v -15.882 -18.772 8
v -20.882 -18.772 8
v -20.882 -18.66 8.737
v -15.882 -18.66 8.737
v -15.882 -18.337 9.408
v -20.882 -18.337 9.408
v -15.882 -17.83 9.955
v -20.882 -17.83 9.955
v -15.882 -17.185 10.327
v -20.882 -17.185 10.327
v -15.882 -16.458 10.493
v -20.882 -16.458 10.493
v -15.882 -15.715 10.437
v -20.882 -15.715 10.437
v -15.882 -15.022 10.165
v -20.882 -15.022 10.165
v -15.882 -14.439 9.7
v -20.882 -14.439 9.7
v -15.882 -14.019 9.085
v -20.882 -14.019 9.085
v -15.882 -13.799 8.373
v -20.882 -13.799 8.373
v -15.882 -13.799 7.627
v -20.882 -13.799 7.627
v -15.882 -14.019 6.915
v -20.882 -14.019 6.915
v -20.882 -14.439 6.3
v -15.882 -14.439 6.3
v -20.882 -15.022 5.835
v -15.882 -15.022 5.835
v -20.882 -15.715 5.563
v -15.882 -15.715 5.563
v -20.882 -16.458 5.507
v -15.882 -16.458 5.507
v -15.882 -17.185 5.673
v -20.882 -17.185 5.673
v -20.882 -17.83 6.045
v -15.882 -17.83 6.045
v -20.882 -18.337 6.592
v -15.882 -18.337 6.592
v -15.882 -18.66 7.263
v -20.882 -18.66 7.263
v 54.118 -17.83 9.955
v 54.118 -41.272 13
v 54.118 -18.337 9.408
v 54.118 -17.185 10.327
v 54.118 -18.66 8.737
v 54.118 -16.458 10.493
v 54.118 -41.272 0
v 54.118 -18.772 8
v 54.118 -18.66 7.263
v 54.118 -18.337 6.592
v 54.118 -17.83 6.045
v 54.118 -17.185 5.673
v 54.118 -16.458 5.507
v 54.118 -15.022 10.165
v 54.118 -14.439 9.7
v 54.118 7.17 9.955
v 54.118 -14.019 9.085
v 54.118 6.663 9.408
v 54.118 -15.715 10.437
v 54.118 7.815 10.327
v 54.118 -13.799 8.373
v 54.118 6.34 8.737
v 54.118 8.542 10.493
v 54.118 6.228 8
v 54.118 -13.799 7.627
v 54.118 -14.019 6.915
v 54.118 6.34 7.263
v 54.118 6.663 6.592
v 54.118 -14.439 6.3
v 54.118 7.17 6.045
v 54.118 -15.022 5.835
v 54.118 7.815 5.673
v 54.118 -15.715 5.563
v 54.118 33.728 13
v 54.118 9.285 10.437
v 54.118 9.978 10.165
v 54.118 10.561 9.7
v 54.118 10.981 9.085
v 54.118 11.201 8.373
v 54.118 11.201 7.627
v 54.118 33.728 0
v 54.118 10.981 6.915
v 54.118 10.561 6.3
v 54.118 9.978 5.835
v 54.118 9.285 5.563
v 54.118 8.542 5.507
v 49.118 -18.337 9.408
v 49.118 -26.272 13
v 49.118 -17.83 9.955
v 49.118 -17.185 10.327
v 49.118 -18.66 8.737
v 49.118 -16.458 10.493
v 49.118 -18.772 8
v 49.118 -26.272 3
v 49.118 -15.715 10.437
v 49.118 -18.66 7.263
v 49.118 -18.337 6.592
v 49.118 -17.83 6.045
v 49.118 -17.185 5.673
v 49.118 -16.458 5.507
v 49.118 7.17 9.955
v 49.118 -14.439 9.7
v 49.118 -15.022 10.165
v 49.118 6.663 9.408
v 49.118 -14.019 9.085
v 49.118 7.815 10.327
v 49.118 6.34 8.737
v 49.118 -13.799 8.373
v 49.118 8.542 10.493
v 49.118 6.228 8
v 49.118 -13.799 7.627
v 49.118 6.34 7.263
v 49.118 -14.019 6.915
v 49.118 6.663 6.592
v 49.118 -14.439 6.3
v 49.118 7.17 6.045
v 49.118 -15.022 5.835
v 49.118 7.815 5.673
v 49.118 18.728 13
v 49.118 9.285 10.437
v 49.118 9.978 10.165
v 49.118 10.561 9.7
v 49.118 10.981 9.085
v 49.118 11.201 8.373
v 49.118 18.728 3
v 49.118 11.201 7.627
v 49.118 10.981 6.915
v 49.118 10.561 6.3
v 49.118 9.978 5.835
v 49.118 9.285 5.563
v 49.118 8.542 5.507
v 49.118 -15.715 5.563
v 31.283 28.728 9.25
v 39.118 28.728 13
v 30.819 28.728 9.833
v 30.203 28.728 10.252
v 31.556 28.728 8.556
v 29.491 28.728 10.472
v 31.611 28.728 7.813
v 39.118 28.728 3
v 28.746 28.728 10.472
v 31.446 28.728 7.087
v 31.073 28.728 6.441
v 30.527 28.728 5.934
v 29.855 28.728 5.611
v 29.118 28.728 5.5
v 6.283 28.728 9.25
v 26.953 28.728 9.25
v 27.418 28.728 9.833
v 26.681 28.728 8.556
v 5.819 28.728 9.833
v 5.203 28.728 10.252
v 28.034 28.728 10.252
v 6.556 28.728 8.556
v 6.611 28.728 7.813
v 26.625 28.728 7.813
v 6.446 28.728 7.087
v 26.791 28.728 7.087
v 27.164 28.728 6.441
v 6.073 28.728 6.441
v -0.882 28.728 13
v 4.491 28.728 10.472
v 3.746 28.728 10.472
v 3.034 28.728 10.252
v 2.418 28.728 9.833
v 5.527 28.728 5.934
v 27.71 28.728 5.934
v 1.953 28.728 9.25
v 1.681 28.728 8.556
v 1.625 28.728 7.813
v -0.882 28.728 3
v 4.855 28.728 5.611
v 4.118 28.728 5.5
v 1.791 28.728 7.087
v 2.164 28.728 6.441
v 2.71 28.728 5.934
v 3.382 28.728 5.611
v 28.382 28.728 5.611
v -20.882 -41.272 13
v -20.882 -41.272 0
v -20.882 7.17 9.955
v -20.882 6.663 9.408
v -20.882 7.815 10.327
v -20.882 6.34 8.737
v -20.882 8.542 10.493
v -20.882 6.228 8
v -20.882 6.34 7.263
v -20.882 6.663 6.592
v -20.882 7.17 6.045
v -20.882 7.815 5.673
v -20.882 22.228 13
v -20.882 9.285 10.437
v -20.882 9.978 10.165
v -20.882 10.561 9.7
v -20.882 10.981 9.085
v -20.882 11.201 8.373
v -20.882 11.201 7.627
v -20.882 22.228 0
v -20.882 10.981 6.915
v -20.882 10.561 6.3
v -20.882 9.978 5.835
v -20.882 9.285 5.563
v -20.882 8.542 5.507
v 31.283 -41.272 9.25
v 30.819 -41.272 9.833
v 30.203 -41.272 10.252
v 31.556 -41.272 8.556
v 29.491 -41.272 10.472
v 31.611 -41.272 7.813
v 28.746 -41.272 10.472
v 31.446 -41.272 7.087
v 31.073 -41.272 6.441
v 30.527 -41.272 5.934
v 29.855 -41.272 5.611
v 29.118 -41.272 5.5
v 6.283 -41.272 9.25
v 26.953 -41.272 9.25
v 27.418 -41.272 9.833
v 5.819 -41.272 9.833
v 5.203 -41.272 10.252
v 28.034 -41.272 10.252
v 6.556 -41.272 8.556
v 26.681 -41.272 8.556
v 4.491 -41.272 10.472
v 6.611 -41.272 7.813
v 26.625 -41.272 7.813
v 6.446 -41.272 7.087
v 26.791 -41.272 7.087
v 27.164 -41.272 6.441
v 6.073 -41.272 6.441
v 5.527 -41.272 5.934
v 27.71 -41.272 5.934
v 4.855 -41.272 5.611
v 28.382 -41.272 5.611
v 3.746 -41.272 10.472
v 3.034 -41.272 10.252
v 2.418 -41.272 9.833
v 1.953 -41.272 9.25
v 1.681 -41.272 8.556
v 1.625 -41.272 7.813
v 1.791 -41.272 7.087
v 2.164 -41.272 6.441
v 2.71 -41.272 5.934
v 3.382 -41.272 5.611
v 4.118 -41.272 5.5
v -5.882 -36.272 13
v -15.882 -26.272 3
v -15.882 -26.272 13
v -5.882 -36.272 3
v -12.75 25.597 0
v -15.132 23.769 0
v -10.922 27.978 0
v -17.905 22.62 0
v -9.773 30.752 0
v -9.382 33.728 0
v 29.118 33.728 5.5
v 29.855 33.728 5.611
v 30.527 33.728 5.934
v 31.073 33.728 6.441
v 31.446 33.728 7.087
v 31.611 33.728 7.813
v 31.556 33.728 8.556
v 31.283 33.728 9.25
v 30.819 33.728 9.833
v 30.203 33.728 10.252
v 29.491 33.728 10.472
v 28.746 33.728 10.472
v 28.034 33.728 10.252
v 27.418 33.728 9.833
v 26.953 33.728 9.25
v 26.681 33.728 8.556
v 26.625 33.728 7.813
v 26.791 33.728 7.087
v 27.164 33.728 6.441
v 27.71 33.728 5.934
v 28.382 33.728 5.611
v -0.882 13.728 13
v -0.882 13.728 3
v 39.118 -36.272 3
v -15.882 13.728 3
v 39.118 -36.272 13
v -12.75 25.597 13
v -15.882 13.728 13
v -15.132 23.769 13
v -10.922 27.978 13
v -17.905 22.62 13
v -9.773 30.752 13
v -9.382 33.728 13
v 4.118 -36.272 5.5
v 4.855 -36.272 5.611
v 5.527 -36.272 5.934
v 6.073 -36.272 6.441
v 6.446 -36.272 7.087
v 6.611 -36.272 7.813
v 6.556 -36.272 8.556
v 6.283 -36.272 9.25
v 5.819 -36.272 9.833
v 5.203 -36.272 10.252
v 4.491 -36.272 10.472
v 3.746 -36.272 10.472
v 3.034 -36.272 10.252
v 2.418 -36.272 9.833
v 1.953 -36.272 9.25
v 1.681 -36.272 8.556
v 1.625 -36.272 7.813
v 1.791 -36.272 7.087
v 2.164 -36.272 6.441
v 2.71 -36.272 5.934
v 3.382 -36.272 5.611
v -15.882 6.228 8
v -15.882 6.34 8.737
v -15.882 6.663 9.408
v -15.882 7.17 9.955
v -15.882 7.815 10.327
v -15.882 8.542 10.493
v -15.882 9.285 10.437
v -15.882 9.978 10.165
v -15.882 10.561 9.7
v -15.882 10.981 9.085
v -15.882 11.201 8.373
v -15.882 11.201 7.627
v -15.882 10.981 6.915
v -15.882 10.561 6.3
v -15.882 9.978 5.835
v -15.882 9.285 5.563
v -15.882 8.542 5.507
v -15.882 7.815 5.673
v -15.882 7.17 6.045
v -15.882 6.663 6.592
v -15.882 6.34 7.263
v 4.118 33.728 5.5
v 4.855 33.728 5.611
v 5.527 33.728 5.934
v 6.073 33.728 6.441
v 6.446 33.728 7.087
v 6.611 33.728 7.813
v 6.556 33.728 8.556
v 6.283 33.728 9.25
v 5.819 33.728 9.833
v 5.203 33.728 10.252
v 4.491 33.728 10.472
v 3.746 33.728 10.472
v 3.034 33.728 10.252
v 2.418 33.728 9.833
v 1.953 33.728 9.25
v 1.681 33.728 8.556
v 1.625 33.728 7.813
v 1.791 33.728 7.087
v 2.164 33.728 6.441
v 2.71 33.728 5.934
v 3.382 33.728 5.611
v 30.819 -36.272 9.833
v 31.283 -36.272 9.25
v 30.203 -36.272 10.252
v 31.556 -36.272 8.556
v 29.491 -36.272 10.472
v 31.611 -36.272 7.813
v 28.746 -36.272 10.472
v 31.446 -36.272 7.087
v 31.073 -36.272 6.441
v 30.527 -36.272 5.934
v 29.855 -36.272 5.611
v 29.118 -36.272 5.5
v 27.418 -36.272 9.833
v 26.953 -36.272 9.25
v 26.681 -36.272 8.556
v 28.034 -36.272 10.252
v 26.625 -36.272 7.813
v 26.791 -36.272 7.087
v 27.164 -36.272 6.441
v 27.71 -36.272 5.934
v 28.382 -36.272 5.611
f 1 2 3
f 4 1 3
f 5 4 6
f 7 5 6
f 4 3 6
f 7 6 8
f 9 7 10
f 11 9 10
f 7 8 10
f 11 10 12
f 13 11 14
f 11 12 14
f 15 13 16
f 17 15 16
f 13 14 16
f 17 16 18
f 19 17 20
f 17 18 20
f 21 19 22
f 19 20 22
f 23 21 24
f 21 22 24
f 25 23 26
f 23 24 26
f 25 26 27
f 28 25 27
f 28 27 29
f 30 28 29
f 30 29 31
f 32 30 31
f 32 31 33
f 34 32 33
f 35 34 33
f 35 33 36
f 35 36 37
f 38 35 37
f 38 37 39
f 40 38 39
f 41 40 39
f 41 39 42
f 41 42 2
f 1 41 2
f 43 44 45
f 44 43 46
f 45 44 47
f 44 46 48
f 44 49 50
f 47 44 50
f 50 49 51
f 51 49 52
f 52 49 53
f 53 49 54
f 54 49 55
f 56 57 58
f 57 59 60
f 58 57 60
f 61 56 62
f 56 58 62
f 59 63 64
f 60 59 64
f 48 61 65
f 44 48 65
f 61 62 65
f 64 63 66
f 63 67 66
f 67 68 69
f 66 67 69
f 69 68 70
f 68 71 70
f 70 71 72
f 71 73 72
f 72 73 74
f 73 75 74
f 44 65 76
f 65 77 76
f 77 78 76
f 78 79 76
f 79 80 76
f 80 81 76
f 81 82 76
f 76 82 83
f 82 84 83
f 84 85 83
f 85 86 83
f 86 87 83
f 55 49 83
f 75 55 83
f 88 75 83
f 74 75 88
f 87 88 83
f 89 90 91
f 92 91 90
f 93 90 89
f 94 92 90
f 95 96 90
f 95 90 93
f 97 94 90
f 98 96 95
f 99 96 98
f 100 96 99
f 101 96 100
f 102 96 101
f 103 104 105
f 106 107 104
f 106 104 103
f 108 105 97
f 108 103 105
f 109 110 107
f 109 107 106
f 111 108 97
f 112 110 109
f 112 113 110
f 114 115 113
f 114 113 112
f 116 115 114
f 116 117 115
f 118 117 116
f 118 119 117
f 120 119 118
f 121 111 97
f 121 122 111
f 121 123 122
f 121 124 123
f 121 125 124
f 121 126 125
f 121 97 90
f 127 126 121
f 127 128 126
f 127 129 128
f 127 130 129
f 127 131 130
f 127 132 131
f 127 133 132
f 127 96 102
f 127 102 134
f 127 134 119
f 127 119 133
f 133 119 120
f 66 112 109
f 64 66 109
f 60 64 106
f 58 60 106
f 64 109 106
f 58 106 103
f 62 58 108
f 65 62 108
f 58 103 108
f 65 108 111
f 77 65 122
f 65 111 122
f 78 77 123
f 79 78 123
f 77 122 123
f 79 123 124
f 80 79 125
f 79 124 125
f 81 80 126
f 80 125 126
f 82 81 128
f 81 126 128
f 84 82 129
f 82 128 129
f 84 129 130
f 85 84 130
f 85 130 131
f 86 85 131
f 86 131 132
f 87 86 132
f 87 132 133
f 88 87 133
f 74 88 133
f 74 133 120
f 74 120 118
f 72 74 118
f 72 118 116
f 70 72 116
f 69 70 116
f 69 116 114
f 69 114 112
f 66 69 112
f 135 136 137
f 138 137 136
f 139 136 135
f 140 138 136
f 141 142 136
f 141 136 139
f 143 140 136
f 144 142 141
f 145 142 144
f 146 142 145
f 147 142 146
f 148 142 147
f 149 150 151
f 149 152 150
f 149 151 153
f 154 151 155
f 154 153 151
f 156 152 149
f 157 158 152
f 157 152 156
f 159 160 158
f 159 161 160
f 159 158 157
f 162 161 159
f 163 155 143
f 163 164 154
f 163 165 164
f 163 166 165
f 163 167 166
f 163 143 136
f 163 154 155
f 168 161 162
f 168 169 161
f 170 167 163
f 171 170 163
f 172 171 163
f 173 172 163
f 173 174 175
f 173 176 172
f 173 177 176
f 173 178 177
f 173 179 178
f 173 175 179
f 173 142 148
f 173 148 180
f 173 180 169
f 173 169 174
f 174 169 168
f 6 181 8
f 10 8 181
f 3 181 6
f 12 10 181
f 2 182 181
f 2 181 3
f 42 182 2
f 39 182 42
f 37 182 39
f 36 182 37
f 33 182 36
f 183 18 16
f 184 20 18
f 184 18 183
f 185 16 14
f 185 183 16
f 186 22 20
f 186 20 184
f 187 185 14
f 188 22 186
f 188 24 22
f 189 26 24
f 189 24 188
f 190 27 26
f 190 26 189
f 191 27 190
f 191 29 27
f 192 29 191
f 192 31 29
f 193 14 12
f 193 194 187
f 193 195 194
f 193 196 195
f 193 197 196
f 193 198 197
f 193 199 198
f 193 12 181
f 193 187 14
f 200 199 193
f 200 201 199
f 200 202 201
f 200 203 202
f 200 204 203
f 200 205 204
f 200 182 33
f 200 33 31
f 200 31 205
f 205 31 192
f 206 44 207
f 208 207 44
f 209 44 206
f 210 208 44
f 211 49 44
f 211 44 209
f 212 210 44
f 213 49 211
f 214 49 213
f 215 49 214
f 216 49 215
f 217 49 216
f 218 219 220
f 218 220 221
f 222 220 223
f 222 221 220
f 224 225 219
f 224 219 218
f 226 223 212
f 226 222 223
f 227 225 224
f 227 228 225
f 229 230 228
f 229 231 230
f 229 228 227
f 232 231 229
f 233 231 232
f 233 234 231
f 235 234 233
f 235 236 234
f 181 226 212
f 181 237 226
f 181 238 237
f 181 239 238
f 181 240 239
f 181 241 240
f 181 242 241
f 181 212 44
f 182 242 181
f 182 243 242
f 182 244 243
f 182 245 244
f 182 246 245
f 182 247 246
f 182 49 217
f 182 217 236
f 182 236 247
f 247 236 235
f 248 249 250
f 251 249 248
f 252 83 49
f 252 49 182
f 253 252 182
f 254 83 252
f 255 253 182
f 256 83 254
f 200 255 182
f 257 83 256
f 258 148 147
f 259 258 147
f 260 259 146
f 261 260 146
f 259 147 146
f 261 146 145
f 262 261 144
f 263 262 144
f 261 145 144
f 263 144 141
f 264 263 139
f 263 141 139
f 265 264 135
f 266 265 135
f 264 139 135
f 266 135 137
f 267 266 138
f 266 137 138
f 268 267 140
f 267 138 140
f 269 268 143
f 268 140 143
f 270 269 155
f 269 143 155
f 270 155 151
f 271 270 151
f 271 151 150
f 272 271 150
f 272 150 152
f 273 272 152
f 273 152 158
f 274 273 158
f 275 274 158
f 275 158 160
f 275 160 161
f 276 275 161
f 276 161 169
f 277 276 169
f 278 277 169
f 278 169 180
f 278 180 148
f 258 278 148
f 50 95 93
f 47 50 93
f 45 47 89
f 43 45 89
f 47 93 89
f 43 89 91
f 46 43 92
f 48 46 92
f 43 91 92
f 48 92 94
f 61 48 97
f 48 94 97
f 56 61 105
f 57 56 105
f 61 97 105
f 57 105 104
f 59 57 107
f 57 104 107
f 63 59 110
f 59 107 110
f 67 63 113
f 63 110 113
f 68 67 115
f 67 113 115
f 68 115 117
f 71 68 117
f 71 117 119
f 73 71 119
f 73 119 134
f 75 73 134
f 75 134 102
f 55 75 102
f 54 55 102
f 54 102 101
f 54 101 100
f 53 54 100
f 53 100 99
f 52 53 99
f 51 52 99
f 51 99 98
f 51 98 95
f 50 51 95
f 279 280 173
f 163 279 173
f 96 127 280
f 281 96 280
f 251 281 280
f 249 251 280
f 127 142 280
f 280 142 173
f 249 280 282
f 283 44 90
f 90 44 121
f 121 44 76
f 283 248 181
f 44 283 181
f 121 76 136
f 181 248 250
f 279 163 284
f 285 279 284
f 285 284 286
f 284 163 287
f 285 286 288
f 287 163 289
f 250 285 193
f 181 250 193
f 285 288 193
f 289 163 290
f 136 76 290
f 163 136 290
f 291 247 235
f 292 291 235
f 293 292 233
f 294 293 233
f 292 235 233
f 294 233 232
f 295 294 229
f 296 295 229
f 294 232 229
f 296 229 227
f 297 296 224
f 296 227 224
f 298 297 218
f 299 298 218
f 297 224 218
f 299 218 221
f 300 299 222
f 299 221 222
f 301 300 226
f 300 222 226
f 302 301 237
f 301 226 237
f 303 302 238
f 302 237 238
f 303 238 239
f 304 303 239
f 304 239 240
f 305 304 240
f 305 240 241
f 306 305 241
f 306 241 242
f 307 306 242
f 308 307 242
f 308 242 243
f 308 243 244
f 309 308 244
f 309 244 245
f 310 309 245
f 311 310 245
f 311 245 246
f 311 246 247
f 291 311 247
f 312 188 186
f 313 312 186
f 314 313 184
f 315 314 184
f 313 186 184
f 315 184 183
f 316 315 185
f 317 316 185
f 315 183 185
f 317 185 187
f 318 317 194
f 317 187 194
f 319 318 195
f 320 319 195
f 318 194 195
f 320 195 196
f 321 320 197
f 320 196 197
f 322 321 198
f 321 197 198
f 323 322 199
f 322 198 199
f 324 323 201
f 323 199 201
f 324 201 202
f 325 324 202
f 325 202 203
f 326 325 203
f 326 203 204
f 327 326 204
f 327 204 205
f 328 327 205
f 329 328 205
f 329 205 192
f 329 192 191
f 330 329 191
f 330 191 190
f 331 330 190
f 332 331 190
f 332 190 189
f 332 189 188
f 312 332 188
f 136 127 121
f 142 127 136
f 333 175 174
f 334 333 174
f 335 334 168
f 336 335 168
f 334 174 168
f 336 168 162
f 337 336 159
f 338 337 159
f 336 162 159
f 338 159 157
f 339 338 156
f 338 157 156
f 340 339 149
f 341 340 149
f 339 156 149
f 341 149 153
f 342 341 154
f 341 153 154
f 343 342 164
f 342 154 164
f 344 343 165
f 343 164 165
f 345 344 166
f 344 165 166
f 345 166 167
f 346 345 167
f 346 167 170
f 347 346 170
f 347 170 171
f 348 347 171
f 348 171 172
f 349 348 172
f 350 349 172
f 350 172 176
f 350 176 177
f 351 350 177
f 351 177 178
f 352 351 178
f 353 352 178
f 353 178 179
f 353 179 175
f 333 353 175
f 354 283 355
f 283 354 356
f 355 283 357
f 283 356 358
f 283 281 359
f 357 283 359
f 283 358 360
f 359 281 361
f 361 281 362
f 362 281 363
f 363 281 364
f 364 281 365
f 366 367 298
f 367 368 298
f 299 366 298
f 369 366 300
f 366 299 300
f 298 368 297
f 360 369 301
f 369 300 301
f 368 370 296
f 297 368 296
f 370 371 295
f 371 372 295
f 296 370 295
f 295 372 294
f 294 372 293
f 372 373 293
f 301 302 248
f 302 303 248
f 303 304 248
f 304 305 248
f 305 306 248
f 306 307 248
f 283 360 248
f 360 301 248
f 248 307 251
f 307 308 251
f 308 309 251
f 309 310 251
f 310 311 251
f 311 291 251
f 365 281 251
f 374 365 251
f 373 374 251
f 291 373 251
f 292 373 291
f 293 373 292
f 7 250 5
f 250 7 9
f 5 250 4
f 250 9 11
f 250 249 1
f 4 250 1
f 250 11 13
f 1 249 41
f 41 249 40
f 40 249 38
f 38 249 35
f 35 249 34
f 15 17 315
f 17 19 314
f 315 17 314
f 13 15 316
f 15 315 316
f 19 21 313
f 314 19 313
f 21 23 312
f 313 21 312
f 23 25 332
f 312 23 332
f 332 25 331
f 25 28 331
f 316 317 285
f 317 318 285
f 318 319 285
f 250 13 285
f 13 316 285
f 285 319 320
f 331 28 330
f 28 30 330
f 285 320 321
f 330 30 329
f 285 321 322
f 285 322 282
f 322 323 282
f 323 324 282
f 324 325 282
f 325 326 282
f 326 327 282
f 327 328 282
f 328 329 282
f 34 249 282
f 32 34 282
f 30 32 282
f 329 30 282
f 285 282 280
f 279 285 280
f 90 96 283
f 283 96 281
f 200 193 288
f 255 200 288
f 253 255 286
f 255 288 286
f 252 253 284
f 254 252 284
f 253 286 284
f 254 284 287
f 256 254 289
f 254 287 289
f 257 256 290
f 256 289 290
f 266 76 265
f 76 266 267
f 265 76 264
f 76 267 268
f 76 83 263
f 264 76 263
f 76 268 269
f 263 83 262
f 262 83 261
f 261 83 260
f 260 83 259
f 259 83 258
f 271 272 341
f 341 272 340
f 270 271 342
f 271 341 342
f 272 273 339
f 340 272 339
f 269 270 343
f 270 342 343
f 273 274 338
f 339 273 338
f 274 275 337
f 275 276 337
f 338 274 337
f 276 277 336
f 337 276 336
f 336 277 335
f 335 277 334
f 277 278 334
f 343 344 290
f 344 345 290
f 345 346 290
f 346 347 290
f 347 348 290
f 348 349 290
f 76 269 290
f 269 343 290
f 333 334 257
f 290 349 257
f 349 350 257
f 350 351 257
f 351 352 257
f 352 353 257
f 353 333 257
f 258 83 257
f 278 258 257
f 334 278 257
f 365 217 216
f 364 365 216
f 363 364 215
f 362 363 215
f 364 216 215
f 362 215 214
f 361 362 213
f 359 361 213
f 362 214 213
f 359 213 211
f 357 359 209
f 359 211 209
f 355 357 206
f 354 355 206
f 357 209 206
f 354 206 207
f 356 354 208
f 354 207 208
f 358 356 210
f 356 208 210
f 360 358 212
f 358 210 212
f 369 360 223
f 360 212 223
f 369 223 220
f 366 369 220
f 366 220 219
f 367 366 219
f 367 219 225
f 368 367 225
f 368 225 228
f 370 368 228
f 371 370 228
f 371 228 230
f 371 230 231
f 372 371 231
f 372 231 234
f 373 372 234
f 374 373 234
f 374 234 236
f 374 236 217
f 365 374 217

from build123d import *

# Parameters (mm, degrees)
BOSS_EXTRU_1_DEPTH        = 13
COQUE1_T                  = -5
COQUE1_THICKNESS_2_FACE_W = 65
COQUE1_THICKNESS_2_FACE_H = 65
COQUE1_THICKNESS_2_DEPTH  = 2
ENL_V_MAT_EXTRU_1_REACH   = 88.587
ESQUISSE2_R               = 2.5
ENL_V_MAT_EXTRU_2_REACH   = 95.396
ESQUISSE3_R               = 2.5
ESQUISSE4_W               = 15
ESQUISSE4_H               = 15
BOSS_EXTRU_2_DEPTH        = 10
ESQUISSE5_R               = 11.5
ENL_V_MAT_EXTRU_3_DEPTH   = 13


with BuildPart() as part:
    # Esquisse1 → Boss.-Extru.1 (new body)
    with BuildSketch(Plane.XY):
        Polygon((44.118436308, 33.728448276), (54.118436308, 33.728448276), (54.118436308, 23.728448276), (54.118436308, -41.271551724), (-20.881563692, -41.271551724), (-20.881563692, 33.728448276), align=None)
    extrude(amount=BOSS_EXTRU_1_DEPTH)

    # Coque1
    coque1_openings = [part.faces().sort_by_distance(p)[0] for p in [
        (16.618436308, -3.771551724, 13),
    ]]
    offset(amount=COQUE1_T, openings=coque1_openings, kind=Kind.INTERSECTION)

    # Coque1 thickness 2 face (on inner face of the shell) → Coque1 thickness 2 (cut)
    with BuildSketch(Plane(origin=(16.618436308, -3.771551724, 5), x_dir=(-1, 0, 0), z_dir=(0, 0, -1))):
        Rectangle(COQUE1_THICKNESS_2_FACE_W, COQUE1_THICKNESS_2_FACE_H)
    extrude(amount=COQUE1_THICKNESS_2_DEPTH, mode=Mode.SUBTRACT)

    # Enlèv. mat.-Extru.1: up to this face of the body (flat: up to its plane)
    enl_v_mat_extru_1_end = Plane(part.part.faces().sort_by_distance((54.118436308, -3.771551724, 6.5))[0])
    # Esquisse2 → Enlèv. mat.-Extru.1 (cut, up to the picked face)
    with BuildSketch(Plane.ZY.offset(20.881563692), mode=Mode.PRIVATE) as enl_v_mat_extru_1_sk1:
        with Locations(Location((8, -16.271551724, 0), (0, 0, 270))):
            Circle(ESQUISSE2_R)
    enl_v_mat_extru_1_tool1 = split(extrude(enl_v_mat_extru_1_sk1.sketch, amount=-ENL_V_MAT_EXTRU_1_REACH, mode=Mode.PRIVATE), bisect_by=enl_v_mat_extru_1_end, keep=Keep.BOTH, mode=Mode.PRIVATE)
    # Esquisse2 → Enlèv. mat.-Extru.1 (cut, up to the picked face)
    with BuildSketch(Plane.ZY.offset(20.881563692), mode=Mode.PRIVATE) as enl_v_mat_extru_1_sk2:
        with Locations(Location((8, 8.728448276, 0), (0, 0, 270))):
            Circle(ESQUISSE2_R)
    enl_v_mat_extru_1_tool2 = split(extrude(enl_v_mat_extru_1_sk2.sketch, amount=-ENL_V_MAT_EXTRU_1_REACH, mode=Mode.PRIVATE), bisect_by=enl_v_mat_extru_1_end, keep=Keep.BOTH, mode=Mode.PRIVATE)
    add(enl_v_mat_extru_1_tool1.solids().sort_by(Axis((-20.881564, -16.271552, 8), (1, 0, 0)))[0], mode=Mode.SUBTRACT)
    add(enl_v_mat_extru_1_tool2.solids().sort_by(Axis((-20.881564, 8.728448, 8), (1, 0, 0)))[0], mode=Mode.SUBTRACT)

    # Enlèv. mat.-Extru.2: up to this face of the body (flat: up to its plane)
    enl_v_mat_extru_2_end = Plane(part.part.faces().sort_by_distance((16.618436308, 33.728448276, 6.5))[0])
    # Esquisse3 → Enlèv. mat.-Extru.2 (cut, up to the picked face)
    with BuildSketch(Plane.XZ.offset(41.271551724), mode=Mode.PRIVATE) as enl_v_mat_extru_2_sk1:
        with Locations(Location((4.118436308, 8, 0), (0, 0, 270))):
            Circle(ESQUISSE3_R)
    enl_v_mat_extru_2_tool1 = split(extrude(enl_v_mat_extru_2_sk1.sketch, amount=-ENL_V_MAT_EXTRU_2_REACH, mode=Mode.PRIVATE), bisect_by=enl_v_mat_extru_2_end, keep=Keep.BOTH, mode=Mode.PRIVATE)
    # Esquisse3 → Enlèv. mat.-Extru.2 (cut, up to the picked face)
    with BuildSketch(Plane.XZ.offset(41.271551724), mode=Mode.PRIVATE) as enl_v_mat_extru_2_sk2:
        with Locations(Location((29.118436308, 8, 0), (0, 0, 270))):
            Circle(ESQUISSE3_R)
    enl_v_mat_extru_2_tool2 = split(extrude(enl_v_mat_extru_2_sk2.sketch, amount=-ENL_V_MAT_EXTRU_2_REACH, mode=Mode.PRIVATE), bisect_by=enl_v_mat_extru_2_end, keep=Keep.BOTH, mode=Mode.PRIVATE)
    add(enl_v_mat_extru_2_tool1.solids().sort_by(Axis((4.118436, -41.271552, 8), (0, 1, 0)))[0], mode=Mode.SUBTRACT)
    add(enl_v_mat_extru_2_tool2.solids().sort_by(Axis((29.118436, -41.271552, 8), (0, 1, 0)))[0], mode=Mode.SUBTRACT)

    # Esquisse4 → Boss.-Extru.2 (add)
    with BuildSketch(Plane.XY.offset(3)):
        Polygon((-15.881563692, -26.271551724), (-5.881563692, -36.271551724), (-15.881563692, -36.271551724), align=None)
        Polygon((49.118436308, 28.728448276), (49.118436308, 18.728448276), (39.118436308, 28.728448276), align=None)
        Polygon((49.118436308, -36.271551724), (49.118436308, -26.271551724), (39.118436308, -36.271551724), align=None)
        with Locations((-8.381563692, 21.228448276)):
            Rectangle(ESQUISSE4_W, ESQUISSE4_H)
    extrude(amount=BOSS_EXTRU_2_DEPTH)

    # Esquisse5 → Enlèv. mat.-Extru.3 (cut)
    with BuildSketch(Plane.XY.offset(13)):
        with Locations((-20.881563692, 33.728448276)):
            Circle(ESQUISSE5_R)
    extrude(amount=-ENL_V_MAT_EXTRU_3_DEPTH, mode=Mode.SUBTRACT)


solid = part.part
